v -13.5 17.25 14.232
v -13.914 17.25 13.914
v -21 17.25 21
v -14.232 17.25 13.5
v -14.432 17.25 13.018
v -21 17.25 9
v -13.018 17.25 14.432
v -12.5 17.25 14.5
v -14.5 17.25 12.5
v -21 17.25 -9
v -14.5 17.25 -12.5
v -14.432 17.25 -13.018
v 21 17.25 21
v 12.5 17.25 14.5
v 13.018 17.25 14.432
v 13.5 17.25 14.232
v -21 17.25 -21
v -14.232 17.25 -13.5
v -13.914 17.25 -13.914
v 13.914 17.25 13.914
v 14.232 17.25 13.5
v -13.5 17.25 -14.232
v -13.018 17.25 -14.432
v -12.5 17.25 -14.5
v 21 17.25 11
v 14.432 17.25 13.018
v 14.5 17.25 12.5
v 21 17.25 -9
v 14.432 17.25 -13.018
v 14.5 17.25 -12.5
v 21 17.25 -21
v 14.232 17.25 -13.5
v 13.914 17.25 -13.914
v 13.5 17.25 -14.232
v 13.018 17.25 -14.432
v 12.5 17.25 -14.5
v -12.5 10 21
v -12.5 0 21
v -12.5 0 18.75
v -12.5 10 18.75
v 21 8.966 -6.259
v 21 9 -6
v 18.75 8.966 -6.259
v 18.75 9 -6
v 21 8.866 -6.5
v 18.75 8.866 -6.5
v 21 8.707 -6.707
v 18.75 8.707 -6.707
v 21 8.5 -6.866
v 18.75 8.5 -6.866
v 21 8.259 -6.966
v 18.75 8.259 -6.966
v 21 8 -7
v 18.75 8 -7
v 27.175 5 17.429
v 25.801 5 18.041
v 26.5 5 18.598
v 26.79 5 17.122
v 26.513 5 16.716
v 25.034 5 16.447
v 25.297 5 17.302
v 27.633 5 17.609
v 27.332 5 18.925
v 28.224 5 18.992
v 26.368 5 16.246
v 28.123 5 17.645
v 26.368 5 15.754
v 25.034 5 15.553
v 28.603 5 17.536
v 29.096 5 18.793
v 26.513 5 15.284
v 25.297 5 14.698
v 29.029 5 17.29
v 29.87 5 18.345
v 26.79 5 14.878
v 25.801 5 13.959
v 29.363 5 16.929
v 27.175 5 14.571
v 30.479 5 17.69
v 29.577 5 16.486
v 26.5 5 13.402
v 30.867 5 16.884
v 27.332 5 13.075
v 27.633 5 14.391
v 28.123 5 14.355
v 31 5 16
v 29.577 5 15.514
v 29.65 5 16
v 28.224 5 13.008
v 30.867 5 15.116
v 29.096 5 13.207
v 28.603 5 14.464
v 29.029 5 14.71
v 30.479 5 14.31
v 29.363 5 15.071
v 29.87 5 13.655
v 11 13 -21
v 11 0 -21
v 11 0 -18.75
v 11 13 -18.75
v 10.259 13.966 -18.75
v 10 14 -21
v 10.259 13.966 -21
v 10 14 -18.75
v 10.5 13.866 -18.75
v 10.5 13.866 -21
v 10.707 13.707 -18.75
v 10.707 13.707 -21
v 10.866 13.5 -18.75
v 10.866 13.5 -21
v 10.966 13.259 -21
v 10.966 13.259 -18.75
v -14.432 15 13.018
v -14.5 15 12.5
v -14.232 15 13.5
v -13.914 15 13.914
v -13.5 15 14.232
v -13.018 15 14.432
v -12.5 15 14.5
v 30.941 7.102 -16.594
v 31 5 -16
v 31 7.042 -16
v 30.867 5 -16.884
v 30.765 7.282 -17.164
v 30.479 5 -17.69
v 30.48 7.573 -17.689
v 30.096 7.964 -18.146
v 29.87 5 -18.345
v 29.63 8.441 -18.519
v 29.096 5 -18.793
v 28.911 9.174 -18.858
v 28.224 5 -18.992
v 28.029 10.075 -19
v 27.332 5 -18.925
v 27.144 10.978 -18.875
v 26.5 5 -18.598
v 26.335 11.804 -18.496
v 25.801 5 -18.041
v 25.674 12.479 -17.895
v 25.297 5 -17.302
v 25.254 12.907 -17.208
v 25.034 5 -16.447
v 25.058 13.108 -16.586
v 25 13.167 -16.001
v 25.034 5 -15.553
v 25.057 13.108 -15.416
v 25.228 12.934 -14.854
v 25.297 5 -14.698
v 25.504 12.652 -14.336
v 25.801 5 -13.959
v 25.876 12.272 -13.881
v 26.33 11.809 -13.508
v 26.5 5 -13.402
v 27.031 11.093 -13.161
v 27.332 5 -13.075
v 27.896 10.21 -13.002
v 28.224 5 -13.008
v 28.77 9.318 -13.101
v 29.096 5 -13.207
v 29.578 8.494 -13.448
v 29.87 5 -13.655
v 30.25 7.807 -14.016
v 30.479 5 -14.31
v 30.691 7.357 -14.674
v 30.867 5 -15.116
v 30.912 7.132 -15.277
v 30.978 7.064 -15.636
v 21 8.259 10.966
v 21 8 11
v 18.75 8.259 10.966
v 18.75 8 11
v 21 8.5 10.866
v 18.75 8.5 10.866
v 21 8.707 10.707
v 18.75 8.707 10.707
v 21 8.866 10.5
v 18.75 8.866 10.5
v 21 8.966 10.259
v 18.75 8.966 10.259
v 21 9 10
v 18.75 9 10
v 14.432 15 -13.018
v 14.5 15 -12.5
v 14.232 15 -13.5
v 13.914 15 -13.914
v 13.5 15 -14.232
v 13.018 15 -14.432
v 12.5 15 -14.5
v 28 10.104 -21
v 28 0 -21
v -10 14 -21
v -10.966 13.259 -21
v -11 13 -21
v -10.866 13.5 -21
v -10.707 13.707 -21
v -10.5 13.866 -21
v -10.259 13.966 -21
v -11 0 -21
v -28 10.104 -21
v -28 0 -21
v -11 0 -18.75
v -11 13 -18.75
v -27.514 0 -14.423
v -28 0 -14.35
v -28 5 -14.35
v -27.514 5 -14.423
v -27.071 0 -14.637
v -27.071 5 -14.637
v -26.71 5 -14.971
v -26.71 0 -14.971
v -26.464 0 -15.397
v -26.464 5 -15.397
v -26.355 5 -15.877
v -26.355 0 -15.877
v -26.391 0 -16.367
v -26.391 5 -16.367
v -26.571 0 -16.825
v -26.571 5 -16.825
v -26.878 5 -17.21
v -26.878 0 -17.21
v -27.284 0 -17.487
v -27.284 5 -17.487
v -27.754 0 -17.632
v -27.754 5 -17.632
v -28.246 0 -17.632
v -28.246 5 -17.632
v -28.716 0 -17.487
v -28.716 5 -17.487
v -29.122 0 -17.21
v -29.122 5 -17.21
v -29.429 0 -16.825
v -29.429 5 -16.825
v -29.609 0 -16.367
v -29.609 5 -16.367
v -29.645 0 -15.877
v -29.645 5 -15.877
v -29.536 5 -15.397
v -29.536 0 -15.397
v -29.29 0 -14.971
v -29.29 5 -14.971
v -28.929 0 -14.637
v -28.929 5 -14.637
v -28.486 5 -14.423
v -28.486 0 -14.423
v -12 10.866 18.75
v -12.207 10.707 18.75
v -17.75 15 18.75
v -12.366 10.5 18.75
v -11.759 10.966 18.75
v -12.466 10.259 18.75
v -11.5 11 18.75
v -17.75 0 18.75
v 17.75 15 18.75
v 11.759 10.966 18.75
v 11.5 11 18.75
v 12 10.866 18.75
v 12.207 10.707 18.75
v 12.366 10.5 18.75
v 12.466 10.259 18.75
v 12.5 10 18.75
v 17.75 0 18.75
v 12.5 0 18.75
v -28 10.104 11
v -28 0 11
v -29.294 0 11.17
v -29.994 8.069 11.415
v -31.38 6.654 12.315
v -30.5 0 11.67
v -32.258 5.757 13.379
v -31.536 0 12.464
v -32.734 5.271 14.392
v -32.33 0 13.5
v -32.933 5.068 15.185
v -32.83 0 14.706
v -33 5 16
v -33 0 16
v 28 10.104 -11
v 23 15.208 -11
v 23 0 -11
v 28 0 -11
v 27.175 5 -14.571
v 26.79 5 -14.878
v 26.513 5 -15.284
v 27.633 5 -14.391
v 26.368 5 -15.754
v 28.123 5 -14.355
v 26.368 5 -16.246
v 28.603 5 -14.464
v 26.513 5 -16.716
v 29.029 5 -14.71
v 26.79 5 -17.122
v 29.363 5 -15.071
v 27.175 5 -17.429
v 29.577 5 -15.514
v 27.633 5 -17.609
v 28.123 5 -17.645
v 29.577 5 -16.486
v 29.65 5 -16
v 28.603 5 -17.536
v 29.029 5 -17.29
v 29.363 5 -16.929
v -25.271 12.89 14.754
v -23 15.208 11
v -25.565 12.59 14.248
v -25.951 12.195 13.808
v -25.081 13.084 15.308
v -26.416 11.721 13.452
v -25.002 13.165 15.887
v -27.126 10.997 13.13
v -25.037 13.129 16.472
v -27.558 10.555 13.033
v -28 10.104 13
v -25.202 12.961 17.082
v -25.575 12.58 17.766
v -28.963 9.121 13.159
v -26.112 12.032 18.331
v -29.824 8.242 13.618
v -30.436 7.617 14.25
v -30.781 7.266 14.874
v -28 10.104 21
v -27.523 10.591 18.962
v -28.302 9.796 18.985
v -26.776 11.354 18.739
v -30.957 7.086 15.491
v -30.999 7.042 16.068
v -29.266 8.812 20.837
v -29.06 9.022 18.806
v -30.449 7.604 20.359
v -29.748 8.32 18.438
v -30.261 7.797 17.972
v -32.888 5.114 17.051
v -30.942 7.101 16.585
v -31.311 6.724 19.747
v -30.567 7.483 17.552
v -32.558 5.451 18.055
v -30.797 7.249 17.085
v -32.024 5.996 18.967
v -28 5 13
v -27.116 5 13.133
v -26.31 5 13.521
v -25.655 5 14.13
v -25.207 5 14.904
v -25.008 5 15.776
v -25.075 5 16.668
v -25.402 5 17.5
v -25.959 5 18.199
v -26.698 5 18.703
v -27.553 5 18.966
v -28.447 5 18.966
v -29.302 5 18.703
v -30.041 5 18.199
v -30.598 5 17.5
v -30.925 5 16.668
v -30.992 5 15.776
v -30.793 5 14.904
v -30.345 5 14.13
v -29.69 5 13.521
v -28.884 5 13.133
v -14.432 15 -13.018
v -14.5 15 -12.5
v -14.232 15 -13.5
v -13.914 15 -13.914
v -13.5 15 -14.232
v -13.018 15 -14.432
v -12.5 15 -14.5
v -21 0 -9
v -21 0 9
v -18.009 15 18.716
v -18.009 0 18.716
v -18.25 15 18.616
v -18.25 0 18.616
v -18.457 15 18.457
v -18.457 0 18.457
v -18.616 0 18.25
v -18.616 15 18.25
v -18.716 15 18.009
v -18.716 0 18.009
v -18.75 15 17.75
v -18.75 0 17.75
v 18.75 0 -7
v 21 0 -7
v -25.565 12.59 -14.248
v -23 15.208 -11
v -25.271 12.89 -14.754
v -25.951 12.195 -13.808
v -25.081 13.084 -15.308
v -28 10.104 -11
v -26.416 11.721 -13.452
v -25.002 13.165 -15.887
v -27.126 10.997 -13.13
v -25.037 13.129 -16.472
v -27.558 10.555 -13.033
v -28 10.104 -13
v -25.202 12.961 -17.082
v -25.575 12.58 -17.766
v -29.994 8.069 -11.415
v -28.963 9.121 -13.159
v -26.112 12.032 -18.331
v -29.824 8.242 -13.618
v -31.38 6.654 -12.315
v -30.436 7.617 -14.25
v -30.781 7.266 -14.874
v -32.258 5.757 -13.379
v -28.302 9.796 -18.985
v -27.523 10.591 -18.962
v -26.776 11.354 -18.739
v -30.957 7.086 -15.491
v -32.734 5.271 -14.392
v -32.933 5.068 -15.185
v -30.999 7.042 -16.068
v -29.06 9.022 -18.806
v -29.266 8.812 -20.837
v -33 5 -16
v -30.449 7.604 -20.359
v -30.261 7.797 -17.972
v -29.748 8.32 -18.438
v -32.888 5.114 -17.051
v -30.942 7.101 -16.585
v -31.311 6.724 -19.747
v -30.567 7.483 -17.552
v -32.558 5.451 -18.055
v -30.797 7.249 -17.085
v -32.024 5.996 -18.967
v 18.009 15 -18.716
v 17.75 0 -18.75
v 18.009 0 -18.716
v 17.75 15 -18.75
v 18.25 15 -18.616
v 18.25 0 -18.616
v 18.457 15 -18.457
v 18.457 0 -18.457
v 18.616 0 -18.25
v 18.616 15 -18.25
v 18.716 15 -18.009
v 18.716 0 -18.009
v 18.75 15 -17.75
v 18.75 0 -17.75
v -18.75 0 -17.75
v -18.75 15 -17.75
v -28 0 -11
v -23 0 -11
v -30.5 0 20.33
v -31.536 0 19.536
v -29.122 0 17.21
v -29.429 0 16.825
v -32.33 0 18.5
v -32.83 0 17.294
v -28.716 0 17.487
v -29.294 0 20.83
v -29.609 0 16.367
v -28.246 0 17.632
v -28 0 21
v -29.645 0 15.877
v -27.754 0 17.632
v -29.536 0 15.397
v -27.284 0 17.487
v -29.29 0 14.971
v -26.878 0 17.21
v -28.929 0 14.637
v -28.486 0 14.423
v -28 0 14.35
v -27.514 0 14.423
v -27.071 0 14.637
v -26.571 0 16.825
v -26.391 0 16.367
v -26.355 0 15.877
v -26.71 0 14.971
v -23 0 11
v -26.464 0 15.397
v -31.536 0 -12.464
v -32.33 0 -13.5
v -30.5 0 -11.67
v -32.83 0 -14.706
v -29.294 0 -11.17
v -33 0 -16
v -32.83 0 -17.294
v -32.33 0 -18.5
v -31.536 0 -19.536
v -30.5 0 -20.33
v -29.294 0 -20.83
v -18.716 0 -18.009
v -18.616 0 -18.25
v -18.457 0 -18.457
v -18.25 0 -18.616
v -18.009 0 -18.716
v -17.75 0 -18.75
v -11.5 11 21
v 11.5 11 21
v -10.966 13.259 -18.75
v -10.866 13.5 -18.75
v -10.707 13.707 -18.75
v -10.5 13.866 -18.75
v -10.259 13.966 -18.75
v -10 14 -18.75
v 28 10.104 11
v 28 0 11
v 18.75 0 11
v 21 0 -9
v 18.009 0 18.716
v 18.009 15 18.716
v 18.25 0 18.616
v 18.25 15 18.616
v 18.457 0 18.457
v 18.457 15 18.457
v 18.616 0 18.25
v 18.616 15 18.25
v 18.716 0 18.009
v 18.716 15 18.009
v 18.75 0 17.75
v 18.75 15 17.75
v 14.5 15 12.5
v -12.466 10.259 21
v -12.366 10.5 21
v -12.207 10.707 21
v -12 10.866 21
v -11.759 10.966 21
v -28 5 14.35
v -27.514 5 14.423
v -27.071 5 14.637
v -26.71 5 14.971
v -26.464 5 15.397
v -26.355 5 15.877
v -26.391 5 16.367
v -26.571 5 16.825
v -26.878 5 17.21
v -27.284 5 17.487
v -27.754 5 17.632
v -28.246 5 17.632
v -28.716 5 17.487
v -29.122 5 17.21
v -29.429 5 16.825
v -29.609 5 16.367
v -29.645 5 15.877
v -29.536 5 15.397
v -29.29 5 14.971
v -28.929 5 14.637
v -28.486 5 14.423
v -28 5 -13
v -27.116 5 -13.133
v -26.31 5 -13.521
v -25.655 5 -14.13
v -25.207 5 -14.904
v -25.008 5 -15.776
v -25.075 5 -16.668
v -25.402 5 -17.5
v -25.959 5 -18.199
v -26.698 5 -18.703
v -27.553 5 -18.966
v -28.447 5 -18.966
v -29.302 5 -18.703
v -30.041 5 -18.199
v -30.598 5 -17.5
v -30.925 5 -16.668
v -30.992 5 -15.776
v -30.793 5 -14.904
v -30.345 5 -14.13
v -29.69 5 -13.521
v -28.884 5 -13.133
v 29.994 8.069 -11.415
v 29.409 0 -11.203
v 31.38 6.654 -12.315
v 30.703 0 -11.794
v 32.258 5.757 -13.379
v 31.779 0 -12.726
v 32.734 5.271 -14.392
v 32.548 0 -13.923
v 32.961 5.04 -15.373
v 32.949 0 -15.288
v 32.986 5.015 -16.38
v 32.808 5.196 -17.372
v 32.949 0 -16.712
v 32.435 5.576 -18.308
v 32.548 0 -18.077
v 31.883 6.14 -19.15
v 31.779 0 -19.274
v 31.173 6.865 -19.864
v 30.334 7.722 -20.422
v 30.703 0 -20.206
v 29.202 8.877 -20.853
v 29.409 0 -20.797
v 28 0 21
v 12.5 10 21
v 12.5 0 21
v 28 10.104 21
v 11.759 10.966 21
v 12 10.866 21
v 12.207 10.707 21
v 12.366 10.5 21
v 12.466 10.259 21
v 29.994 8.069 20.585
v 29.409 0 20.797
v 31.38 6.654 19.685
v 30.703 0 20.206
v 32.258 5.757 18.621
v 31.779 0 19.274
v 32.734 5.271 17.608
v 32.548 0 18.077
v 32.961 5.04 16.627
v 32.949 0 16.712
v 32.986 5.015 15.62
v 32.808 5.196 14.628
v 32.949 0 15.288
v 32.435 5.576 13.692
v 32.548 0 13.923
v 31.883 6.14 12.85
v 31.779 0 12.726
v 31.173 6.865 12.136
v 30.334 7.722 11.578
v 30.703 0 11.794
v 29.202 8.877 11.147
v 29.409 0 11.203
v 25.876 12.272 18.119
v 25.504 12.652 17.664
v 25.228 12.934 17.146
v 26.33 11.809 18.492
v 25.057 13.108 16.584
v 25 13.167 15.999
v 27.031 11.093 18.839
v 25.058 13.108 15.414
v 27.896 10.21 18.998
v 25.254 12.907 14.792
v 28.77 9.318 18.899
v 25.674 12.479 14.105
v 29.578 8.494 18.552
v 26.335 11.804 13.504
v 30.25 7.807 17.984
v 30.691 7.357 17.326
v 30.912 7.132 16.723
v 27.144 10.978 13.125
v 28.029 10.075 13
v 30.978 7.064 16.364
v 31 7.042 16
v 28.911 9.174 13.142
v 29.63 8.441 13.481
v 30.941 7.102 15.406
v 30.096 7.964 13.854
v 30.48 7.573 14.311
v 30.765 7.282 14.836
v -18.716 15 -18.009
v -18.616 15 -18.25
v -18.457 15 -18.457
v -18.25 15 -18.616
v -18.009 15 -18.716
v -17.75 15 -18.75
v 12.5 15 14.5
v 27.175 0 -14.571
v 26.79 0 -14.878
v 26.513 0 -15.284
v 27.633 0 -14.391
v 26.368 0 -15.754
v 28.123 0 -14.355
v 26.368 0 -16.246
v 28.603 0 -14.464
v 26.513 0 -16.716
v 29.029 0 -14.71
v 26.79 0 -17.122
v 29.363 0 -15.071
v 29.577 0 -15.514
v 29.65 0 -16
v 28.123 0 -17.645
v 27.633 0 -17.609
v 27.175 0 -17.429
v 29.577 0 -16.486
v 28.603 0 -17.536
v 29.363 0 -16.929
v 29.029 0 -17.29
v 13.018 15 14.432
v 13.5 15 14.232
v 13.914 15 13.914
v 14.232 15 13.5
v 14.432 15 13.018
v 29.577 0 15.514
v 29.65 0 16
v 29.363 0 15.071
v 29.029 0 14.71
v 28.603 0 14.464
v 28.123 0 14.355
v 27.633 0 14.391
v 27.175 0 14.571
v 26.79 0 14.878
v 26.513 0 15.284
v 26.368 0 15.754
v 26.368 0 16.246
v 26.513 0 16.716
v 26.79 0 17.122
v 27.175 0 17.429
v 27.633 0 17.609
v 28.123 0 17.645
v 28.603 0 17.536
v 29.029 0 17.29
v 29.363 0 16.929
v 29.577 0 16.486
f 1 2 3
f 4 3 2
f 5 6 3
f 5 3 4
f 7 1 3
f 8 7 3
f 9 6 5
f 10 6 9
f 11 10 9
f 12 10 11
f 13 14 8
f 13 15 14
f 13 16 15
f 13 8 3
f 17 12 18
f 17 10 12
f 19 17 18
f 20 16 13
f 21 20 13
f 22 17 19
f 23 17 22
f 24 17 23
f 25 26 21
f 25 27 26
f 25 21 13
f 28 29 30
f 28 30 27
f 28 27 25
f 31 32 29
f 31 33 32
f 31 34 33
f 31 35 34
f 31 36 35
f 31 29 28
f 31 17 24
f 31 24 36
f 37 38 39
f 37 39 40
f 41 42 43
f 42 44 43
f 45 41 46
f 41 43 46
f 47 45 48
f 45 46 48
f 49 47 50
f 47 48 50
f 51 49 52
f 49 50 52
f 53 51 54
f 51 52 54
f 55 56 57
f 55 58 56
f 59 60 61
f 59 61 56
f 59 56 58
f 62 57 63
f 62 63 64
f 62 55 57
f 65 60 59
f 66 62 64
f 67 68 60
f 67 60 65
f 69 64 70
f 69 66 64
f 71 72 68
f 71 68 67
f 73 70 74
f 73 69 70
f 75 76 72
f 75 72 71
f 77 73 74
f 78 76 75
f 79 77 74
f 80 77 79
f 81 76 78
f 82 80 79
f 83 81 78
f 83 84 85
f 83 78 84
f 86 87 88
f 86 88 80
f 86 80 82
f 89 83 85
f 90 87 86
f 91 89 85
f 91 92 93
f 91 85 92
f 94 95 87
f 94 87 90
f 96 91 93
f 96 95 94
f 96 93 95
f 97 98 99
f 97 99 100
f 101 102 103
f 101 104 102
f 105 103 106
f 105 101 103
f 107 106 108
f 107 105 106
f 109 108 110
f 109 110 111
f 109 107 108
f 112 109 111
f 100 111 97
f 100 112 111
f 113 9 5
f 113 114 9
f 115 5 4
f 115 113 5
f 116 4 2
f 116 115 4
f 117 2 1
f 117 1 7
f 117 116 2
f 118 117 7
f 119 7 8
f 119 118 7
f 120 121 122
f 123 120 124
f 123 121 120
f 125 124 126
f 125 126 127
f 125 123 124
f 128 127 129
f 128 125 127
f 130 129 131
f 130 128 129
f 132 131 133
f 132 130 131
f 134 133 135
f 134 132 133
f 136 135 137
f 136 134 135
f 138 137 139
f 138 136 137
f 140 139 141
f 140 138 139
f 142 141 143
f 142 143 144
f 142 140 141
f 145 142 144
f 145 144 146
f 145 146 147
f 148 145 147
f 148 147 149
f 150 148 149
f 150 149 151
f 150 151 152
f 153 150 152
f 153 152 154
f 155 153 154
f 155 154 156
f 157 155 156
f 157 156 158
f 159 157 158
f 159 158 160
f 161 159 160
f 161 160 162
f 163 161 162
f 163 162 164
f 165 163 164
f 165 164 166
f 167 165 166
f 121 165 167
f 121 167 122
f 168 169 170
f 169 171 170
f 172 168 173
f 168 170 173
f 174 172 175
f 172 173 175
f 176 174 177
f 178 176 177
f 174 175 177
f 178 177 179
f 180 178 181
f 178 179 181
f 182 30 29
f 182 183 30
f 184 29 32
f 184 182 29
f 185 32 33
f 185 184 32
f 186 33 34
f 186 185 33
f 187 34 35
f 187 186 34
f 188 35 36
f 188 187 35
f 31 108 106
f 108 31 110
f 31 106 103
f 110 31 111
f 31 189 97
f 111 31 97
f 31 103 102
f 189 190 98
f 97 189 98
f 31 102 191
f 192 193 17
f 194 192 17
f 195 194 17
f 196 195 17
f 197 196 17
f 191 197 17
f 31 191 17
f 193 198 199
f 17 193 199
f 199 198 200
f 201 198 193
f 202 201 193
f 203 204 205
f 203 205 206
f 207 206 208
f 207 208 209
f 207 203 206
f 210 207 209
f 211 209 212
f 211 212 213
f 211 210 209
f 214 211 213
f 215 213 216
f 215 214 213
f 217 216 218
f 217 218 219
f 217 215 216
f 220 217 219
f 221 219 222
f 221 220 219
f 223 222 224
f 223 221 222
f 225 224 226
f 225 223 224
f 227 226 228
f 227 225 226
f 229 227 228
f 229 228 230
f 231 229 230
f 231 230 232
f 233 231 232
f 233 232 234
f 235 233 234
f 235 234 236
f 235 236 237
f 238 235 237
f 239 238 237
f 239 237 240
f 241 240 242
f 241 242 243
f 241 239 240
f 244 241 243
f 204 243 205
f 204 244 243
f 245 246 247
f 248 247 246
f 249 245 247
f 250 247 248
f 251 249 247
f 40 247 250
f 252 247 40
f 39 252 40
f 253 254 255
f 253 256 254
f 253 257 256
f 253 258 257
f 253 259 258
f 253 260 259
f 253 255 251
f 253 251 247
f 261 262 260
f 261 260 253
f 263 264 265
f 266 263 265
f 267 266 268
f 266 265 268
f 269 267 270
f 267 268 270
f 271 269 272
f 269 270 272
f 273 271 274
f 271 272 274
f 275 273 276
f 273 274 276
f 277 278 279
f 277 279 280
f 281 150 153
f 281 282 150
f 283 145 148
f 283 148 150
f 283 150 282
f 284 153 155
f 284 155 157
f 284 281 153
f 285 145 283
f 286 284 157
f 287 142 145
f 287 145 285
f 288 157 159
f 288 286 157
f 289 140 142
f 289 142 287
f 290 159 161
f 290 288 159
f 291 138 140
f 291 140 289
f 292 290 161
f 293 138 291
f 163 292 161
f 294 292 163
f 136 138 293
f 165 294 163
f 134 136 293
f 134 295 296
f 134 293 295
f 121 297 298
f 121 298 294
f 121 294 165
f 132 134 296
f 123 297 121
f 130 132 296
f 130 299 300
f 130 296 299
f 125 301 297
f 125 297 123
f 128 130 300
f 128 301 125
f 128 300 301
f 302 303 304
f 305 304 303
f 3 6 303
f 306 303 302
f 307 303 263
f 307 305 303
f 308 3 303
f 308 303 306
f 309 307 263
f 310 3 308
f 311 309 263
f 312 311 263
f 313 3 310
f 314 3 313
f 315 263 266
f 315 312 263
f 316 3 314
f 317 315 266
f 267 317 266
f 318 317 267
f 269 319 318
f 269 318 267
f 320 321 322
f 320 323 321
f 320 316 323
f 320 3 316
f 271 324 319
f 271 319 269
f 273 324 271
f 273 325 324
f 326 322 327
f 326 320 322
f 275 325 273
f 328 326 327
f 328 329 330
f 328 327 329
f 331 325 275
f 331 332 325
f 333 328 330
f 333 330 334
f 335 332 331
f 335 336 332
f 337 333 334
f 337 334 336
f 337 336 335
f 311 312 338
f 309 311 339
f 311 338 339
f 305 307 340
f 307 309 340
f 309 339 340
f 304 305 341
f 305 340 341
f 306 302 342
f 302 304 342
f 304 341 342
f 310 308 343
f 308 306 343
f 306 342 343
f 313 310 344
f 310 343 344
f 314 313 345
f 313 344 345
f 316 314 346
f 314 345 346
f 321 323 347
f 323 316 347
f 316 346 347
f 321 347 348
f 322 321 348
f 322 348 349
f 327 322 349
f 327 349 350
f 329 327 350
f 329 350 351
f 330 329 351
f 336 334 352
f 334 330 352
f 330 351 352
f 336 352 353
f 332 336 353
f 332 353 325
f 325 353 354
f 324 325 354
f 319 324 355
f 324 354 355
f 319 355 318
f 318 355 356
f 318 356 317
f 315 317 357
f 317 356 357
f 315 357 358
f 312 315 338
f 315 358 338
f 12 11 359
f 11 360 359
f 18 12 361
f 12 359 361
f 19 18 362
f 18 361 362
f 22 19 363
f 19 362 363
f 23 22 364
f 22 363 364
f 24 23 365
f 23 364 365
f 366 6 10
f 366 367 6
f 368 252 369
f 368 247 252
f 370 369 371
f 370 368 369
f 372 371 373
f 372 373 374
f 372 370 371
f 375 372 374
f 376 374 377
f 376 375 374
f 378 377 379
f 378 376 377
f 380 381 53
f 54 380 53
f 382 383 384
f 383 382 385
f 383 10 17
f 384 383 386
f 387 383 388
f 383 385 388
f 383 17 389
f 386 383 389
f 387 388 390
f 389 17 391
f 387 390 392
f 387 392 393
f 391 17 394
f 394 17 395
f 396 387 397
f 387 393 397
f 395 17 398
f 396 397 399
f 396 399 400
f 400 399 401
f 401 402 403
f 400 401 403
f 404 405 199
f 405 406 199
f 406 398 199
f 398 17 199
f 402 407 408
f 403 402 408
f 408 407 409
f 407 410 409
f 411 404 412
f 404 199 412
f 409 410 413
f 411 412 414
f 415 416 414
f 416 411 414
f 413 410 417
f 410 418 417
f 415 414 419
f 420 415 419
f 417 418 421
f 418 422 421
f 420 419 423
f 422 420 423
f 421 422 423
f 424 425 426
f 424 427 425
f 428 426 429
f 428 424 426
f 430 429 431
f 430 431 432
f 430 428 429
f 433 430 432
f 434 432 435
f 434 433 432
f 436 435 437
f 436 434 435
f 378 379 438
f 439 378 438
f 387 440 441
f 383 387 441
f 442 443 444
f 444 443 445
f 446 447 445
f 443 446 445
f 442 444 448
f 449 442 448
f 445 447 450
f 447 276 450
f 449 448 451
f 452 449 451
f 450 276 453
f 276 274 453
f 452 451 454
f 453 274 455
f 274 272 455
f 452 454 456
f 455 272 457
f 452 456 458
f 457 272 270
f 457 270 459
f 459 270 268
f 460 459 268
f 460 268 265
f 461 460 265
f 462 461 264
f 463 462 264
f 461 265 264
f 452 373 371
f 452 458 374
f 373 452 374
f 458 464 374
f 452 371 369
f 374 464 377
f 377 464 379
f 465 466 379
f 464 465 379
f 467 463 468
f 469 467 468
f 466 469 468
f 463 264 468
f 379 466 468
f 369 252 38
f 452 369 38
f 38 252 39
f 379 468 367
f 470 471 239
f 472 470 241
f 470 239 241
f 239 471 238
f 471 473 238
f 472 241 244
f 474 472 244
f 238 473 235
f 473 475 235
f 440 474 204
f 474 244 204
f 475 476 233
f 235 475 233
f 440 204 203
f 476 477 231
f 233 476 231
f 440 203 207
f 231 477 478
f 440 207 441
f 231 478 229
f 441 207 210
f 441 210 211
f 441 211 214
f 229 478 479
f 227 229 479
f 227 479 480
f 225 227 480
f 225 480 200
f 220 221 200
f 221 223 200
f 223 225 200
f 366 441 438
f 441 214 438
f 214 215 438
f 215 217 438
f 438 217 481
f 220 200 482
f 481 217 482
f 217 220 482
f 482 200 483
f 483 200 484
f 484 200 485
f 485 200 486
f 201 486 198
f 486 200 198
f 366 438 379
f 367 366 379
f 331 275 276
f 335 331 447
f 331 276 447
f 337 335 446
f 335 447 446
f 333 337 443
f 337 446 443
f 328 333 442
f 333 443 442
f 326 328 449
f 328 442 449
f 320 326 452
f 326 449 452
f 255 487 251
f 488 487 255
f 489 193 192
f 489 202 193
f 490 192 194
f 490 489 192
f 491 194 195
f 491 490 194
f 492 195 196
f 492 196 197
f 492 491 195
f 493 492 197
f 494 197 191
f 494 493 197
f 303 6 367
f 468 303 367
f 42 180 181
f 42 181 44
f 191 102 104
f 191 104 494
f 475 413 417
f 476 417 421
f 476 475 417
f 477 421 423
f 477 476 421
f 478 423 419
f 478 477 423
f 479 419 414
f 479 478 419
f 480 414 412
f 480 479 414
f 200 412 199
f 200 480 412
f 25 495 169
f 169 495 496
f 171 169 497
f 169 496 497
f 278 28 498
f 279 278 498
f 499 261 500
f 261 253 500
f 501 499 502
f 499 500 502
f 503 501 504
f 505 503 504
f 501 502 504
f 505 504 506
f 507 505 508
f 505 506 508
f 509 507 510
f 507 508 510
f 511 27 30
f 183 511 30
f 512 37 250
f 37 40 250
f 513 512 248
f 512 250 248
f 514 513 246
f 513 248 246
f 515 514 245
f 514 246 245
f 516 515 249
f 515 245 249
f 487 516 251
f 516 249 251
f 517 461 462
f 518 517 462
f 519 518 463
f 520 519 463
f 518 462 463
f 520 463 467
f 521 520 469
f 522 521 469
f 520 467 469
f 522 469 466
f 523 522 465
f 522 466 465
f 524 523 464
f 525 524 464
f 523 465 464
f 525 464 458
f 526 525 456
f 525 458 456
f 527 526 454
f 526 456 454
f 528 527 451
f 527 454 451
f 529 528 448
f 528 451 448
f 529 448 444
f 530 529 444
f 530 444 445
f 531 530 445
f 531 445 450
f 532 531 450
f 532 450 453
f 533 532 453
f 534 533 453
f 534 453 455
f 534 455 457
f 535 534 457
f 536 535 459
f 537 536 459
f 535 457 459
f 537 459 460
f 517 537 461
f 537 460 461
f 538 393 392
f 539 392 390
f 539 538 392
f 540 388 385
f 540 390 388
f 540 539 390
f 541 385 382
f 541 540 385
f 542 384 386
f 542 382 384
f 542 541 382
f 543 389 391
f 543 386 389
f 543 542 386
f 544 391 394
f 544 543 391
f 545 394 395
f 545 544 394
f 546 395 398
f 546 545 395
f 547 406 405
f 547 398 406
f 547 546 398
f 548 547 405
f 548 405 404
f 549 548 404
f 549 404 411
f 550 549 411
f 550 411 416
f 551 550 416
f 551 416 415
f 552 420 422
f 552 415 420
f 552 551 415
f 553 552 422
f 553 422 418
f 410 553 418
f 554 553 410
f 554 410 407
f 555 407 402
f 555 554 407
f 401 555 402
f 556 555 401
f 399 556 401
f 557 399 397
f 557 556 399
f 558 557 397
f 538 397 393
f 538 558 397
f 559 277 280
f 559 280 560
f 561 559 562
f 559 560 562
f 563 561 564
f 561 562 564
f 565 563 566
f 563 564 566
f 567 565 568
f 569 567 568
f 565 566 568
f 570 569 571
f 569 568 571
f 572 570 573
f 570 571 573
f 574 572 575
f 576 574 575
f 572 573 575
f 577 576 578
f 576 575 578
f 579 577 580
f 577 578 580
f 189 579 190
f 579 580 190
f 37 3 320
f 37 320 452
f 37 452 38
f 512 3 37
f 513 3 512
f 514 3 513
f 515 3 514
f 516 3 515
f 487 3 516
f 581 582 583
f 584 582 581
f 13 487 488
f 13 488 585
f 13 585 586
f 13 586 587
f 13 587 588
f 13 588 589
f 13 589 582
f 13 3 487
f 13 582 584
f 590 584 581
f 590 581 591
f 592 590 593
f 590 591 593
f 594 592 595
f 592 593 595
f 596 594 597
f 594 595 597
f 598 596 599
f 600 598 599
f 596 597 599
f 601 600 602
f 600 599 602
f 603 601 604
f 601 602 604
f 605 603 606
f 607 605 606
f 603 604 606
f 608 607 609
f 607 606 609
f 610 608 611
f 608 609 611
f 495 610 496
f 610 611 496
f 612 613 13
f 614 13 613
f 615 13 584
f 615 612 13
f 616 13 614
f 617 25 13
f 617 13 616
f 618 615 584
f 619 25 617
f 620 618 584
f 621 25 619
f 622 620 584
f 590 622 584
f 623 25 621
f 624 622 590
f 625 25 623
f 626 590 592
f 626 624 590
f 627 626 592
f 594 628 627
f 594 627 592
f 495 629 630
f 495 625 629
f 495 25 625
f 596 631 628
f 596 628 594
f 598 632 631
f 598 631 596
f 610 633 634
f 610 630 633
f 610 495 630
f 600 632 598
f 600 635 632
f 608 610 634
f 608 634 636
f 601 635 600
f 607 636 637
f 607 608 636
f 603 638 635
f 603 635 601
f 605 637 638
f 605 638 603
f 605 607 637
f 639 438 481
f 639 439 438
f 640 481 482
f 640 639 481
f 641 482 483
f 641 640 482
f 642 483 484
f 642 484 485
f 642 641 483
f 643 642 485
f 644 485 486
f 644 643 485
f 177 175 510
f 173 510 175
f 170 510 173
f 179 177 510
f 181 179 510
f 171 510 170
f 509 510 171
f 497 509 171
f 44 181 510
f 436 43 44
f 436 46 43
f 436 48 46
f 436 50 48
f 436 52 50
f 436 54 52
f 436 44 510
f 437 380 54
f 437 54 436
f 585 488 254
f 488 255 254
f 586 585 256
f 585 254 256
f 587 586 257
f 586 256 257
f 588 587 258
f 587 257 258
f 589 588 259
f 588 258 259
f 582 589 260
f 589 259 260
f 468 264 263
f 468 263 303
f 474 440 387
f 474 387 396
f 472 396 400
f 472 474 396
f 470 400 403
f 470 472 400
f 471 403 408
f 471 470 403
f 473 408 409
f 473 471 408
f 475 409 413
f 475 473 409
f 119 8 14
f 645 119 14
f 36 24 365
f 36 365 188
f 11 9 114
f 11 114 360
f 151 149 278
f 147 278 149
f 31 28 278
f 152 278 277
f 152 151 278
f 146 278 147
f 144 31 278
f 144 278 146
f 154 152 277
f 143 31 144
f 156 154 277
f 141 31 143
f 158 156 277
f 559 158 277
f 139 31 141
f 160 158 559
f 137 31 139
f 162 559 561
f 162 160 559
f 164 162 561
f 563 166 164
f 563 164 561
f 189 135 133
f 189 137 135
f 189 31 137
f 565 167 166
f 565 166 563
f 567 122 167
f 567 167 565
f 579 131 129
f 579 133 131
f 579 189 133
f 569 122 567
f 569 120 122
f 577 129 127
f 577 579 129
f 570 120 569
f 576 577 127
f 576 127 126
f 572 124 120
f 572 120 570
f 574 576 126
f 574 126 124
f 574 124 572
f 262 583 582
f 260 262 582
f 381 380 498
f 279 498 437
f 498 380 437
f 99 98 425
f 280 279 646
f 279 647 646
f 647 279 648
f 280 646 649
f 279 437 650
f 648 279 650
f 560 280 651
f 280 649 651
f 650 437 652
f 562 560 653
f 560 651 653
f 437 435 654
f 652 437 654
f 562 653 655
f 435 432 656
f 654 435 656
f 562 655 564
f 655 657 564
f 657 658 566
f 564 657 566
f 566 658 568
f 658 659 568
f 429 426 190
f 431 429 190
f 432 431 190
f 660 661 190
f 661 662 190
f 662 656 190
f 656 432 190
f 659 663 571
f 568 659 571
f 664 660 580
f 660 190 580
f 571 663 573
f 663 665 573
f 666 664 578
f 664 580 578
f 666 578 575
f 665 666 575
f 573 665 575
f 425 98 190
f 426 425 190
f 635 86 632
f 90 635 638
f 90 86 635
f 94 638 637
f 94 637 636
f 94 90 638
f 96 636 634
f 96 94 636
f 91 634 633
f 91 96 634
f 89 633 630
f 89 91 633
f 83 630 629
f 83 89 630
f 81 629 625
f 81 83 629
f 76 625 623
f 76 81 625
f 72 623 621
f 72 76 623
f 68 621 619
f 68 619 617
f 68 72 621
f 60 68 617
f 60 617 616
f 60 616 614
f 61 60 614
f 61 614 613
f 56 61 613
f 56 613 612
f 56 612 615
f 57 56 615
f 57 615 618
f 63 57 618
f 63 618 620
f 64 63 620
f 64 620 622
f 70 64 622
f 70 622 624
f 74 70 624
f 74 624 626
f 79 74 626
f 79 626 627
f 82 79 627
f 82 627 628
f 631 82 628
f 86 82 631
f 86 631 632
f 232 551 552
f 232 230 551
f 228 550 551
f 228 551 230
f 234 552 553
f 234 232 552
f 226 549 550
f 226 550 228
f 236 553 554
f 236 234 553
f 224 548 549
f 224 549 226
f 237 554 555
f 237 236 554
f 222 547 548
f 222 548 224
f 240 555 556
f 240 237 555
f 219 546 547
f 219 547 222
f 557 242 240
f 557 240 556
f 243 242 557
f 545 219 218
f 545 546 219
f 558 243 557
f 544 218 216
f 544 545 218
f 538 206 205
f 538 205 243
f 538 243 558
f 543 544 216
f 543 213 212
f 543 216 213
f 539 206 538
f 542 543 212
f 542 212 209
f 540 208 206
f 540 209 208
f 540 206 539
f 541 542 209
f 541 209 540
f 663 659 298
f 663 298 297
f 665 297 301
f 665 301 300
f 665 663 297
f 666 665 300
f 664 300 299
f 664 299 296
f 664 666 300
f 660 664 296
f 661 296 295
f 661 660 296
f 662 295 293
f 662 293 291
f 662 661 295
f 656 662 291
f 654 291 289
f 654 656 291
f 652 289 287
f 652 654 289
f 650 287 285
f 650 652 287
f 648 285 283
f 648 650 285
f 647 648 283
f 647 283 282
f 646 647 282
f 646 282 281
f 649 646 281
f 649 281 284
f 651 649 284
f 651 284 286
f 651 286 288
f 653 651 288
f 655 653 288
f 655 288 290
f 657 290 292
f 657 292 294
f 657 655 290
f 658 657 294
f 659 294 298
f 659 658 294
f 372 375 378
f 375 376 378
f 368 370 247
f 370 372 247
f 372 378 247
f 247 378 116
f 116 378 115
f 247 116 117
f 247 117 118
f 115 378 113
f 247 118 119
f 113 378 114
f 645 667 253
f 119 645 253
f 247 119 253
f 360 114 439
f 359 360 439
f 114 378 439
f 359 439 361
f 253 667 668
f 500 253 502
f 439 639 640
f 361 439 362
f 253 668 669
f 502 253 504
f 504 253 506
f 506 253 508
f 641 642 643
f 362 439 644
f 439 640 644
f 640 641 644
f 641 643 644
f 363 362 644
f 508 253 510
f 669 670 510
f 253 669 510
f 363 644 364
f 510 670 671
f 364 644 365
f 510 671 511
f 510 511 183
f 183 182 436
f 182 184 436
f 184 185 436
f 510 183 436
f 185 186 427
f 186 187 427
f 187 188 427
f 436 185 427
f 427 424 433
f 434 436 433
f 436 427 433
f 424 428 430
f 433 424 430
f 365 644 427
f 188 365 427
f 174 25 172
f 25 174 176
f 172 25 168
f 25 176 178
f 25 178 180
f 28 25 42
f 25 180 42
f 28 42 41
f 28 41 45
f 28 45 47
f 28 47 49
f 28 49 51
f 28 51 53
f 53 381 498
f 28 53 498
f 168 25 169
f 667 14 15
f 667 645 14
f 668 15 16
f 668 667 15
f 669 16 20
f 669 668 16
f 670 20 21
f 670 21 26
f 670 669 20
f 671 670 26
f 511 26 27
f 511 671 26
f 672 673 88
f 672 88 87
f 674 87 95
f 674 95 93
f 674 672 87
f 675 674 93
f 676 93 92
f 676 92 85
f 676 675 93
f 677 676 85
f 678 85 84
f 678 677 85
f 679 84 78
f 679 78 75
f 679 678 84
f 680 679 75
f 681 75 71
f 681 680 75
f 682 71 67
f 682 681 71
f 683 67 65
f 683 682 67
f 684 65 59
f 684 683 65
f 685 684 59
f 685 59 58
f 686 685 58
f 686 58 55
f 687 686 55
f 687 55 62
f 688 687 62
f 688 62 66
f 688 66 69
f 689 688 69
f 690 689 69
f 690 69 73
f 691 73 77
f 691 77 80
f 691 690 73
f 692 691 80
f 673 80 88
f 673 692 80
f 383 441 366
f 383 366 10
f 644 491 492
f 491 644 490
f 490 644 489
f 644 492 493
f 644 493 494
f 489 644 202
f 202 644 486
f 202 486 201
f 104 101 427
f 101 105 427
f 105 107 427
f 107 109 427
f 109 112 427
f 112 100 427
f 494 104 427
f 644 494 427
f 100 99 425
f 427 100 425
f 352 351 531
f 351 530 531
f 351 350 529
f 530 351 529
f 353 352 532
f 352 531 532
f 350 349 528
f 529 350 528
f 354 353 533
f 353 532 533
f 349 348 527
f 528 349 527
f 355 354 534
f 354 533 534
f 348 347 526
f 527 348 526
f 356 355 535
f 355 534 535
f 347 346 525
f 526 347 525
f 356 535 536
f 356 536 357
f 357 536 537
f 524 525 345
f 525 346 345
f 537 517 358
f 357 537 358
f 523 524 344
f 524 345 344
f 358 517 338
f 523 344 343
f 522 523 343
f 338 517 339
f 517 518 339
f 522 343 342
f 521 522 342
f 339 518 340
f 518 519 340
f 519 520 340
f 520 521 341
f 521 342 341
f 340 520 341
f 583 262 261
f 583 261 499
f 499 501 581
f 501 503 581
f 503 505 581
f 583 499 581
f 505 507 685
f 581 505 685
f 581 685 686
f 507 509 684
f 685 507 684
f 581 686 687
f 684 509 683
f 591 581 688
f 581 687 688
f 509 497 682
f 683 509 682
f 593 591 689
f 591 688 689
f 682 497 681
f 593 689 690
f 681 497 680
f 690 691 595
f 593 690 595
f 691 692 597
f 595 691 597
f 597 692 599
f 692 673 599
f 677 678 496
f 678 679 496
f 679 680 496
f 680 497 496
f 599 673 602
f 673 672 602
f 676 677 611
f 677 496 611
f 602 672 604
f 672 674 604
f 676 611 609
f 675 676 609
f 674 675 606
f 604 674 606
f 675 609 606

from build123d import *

# Parameters (mm, degrees)
SKETCH1_W           = 37.5
SKETCH1_H           = 37.5
BOSS_EXTRUDE1_DEPTH = 15
SHELL1_T            = 2.25
CUT_EXTRUDE1_REACH  = 52.026
SKETCH2_W           = 25
SKETCH2_H           = 11
CUT_EXTRUDE2_REACH  = 52.026
SKETCH3_W           = 18
SKETCH3_H           = 9
CUT_EXTRUDE3_REACH  = 36.345
SKETCH5_W           = 29
SKETCH5_H           = 29
FILLET1_R           = 2
CUT_EXTRUDE4_REACH  = 52.026
SKETCH6_W           = 22
SKETCH6_H           = 14
FILLET2_R           = 1
SKETCH9_W           = 12
SKETCH9_H           = 10
BOSS_EXTRUDE3_DEPTH = 5
BOSS_EXTRUDE4_DEPTH = 10
SKETCH11_R          = 1.65
CUT_EXTRUDE5_DEPTH  = 5
CUT_EXTRUDE6_REACH  = 42.989
SKETCH12_R          = 3
CUT_EXTRUDE7_REACH  = 44.75
MIRROR3_OUTLINE_R   = 1.65
MIRROR3_DEPTH       = 5
MIRROR3_START       = 5
MIRROR3_2_OUTLINE_R = 3
MIRROR3_2_DEPTH     = 12.25
MIRROR3_START_2     = 27.072732359
MIRROR3_3_OUTLINE_W = 20
MIRROR3_3_OUTLINE_H = 11
MIRROR3_3_DEPTH     = 9.927267641
CHAMFER1_SIZE       = 2
FILLET3_R           = 1


with BuildPart() as part:
    # Sketch1 → Boss-Extrude1 (new body)
    with BuildSketch(Plane(origin=(0, 0, 0), x_dir=(1, 0, 0), z_dir=(0, 1, 0))):
        Rectangle(SKETCH1_W, SKETCH1_H)
    extrude(amount=BOSS_EXTRUDE1_DEPTH)

    # Shell1
    shell1_openings = [part.faces().sort_by_distance(p)[0] for p in [
        (0, 0, 0),
    ]]
    offset(amount=SHELL1_T, openings=shell1_openings, kind=Kind.INTERSECTION)

    # Sketch2 → Cut-Extrude1 (cut, up to next)
    with BuildSketch(Plane.XY.offset(21), mode=Mode.PRIVATE) as cut_extrude1_sk1:
        with Locations((0, 5.5)):
            Rectangle(SKETCH2_W, SKETCH2_H)
    cut_extrude1_tool1 = extrude(cut_extrude1_sk1.sketch, amount=-CUT_EXTRUDE1_REACH, mode=Mode.PRIVATE) & part.part
    add(cut_extrude1_tool1.solids().sort_by_distance((0, 5.5, 21))[0], mode=Mode.SUBTRACT)

    # Sketch3 → Cut-Extrude2 (cut, up to next)
    with BuildSketch(Plane(origin=(21, 0, 0), x_dir=(0, 0, -1), z_dir=(1, 0, 0)), mode=Mode.PRIVATE) as cut_extrude2_sk1:
        with Locations((-2, 4.5)):
            Rectangle(SKETCH3_W, SKETCH3_H)
    cut_extrude2_tool1 = extrude(cut_extrude2_sk1.sketch, amount=-CUT_EXTRUDE2_REACH, mode=Mode.PRIVATE) & part.part
    add(cut_extrude2_tool1.solids().sort_by_distance((21, 4.5, 2))[0], mode=Mode.SUBTRACT)

    # Sketch5 → Cut-Extrude3 (cut, up to next)
    with BuildSketch(Plane(origin=(0, 17.25, 0), x_dir=(1, 0, 0), z_dir=(0, 1, 0)), mode=Mode.PRIVATE) as cut_extrude3_sk1:
        Rectangle(SKETCH5_W, SKETCH5_H)
    cut_extrude3_tool1 = extrude(cut_extrude3_sk1.sketch, amount=-CUT_EXTRUDE3_REACH, mode=Mode.PRIVATE) & part.part
    add(cut_extrude3_tool1.solids().sort_by_distance((0, 17.25, 0))[0], mode=Mode.SUBTRACT)

    # Fillet1
    fillet1_edges = [part.edges().sort_by_distance(p)[0] for p in [
        (14.5, 16.125, -14.5),
        (14.5, 16.125, 14.5),
        (-14.5, 16.125, 14.5),
        (-14.5, 16.125, -14.5),
    ]]
    fillet(fillet1_edges, radius=FILLET1_R)

    # Sketch6 → Cut-Extrude4 (cut, up to next)
    with BuildSketch(Plane(origin=(0, 0, -21), x_dir=(-1, 0, 0), z_dir=(0, 0, -1)), mode=Mode.PRIVATE) as cut_extrude4_sk1:
        with Locations((0, 7)):
            Rectangle(SKETCH6_W, SKETCH6_H)
    cut_extrude4_tool1 = extrude(cut_extrude4_sk1.sketch, amount=-CUT_EXTRUDE4_REACH, mode=Mode.PRIVATE) & part.part
    add(cut_extrude4_tool1.solids().sort_by_distance((0, 7, -21))[0], mode=Mode.SUBTRACT)

    # Fillet2
    fillet2_edges = [part.edges().sort_by_distance(p)[0] for p in [
        (-11, 14, -19.875),
        (11, 14, -19.875),
        (12.5, 11, 19.875),
        (-12.5, 11, 19.875),
        (19.875, 9, 11),
        (19.875, 9, -7),
    ]]
    fillet(fillet2_edges, radius=FILLET2_R)

    # Sketch9 → Boss-Extrude3 (add)
    with BuildSketch(Plane.XZ):
        with Locations((-27, 16)):
            Rectangle(SKETCH9_W, SKETCH9_H)
    boss_extrude3 = extrude(amount=-BOSS_EXTRUDE3_DEPTH)

    # Sketch10 → Boss-Extrude4 (add)
    with BuildSketch(Plane.XY.offset(21)):
        Polygon((-21, 17.25), (-33, 5), (-21, 5), align=None)
    boss_extrude4 = extrude(amount=-BOSS_EXTRUDE4_DEPTH)

    # Sketch11 → Cut-Extrude5 (cut)
    with BuildSketch(Plane.XZ):
        with Locations(Location((-28, 16, 0), (0, 0, 270))):
            Circle(SKETCH11_R)
    cut_extrude5 = extrude(amount=-CUT_EXTRUDE5_DEPTH, mode=Mode.SUBTRACT)

    # Cut-Extrude6: up to this plane
    cut_extrude6_end = Plane(origin=(-21, 17.25, -6.14825064), z_dir=(-0.7143585813751187, 0.6997798348164429, 0))
    # Sketch12 → Cut-Extrude6 (cut, up to the surface)
    with BuildSketch(Plane.XZ.offset(-5), mode=Mode.PRIVATE) as cut_extrude6_sk1:
        with Locations(Location((-28, 16, 0), (0, 0, 270))):
            Circle(SKETCH12_R)
    cut_extrude6_tool1 = split(extrude(cut_extrude6_sk1.sketch, amount=-CUT_EXTRUDE6_REACH, mode=Mode.PRIVATE), bisect_by=cut_extrude6_end, keep=Keep.BOTH, mode=Mode.PRIVATE)
    cut_extrude6 = cut_extrude6_tool1.solids().sort_by_distance((-28, 5, 16))[0]
    add(cut_extrude6, mode=Mode.SUBTRACT)

    # Cut-Extrude7: up to this plane
    cut_extrude7_end = Plane(origin=(-21, 17.25, -6.14825064), z_dir=(-0.7143585813751187, 0.6997798348164429, 0))
    # Sketch13 → Cut-Extrude7 (cut, up to the surface)
    with BuildSketch(Plane.XZ, mode=Mode.PRIVATE) as cut_extrude7_sk1:
        with BuildLine():
            ThreePointArc((-33, 16), (-31.535533906, 19.535533906), (-28, 21))
            Line((-28, 21), (-33, 21))
            Line((-33, 21), (-33, 16))
        make_face()
    cut_extrude7_tool1 = split(extrude(cut_extrude7_sk1.sketch, amount=-CUT_EXTRUDE7_REACH, mode=Mode.PRIVATE), bisect_by=cut_extrude7_end, keep=Keep.BOTH, mode=Mode.PRIVATE)
    # Sketch13 → Cut-Extrude7 (cut, up to the surface)
    with BuildSketch(Plane.XZ, mode=Mode.PRIVATE) as cut_extrude7_sk2:
        with BuildLine():
            Line((-33, 11), (-28, 11))
            ThreePointArc((-28, 11), (-31.535533906, 12.464466094), (-33, 16))
            Line((-33, 16), (-33, 11))
        make_face()
    cut_extrude7_tool2 = split(extrude(cut_extrude7_sk2.sketch, amount=-CUT_EXTRUDE7_REACH, mode=Mode.PRIVATE), bisect_by=cut_extrude7_end, keep=Keep.BOTH, mode=Mode.PRIVATE)
    cut_extrude7 = cut_extrude7_tool1.solids().sort_by_distance((-31.88316, 0, 19.88316))[0] + cut_extrude7_tool2.solids().sort_by_distance((-31.88316, 0, 12.11684))[0]
    add(cut_extrude7, mode=Mode.SUBTRACT)

    # Mirror1: Boss-Extrude3, Boss-Extrude4, Cut-Extrude5, Cut-Extrude6, Cut-Extrude7 across plane
    add(boss_extrude3.mirror(Plane.XY))
    add(boss_extrude4.mirror(Plane.XY))
    add(cut_extrude5.mirror(Plane.XY), mode=Mode.SUBTRACT)
    add(cut_extrude6.mirror(Plane.XY), mode=Mode.SUBTRACT)
    add(cut_extrude7.mirror(Plane.XY), mode=Mode.SUBTRACT)

    # Mirror3: read off the stored shape, not the designer's step
    # Mirror3 outline → Mirror3 (add)
    # profile 1 of 2: a face of its own
    with BuildSketch(Plane(origin=(0, 0, 0), x_dir=(1, 0, 0), z_dir=(0, 1, 0))):
        with BuildLine():
            Line((21, 21), (21, 11))
            Line((21, 11), (28, 11))
            ThreePointArc((28, 11), (33, 16), (28, 21))
            Line((28, 21), (21, 21))
        make_face()
        with Locations((28, 16)):
            Circle(MIRROR3_OUTLINE_R, mode=Mode.SUBTRACT)
    # profile 2 of 2: a face of its own
    with BuildSketch(Plane(origin=(0, 0, 0), x_dir=(1, 0, 0), z_dir=(0, 1, 0))):
        with BuildLine():
            Line((28, -11), (21, -11))
            Line((21, -11), (21, -21))
            Line((21, -21), (28, -21))
            ThreePointArc((28, -21), (33, -16), (28, -11))
        make_face()
        with Locations((28, -16)):
            Circle(MIRROR3_OUTLINE_R, mode=Mode.SUBTRACT)
    extrude(amount=MIRROR3_DEPTH)

    # Mirror3 2 outline → Mirror3 2 (add)
    # profile 1 of 2: a face of its own
    with BuildSketch(Plane(origin=(0, 0, 0), x_dir=(1, 0, 0), z_dir=(0, 1, 0)).offset(MIRROR3_START)):
        with BuildLine():
            Line((21, 21), (21, 11))
            Line((21, 11), (28, 11))
            ThreePointArc((28, 11), (33, 16), (28, 21))
            Line((28, 21), (21, 21))
        make_face()
        with Locations((28, 16)):
            Circle(MIRROR3_2_OUTLINE_R, mode=Mode.SUBTRACT)
    # profile 2 of 2: a face of its own
    with BuildSketch(Plane(origin=(0, 0, 0), x_dir=(1, 0, 0), z_dir=(0, 1, 0)).offset(MIRROR3_START)):
        with BuildLine():
            Line((28, -11), (21, -11))
            Line((21, -11), (21, -21))
            Line((21, -21), (28, -21))
            ThreePointArc((28, -21), (33, -16), (28, -11))
        make_face()
        with Locations((28, -16)):
            Circle(MIRROR3_2_OUTLINE_R, mode=Mode.SUBTRACT)
    extrude(amount=MIRROR3_2_DEPTH)

    # Mirror3 3 outline → Mirror3 3 (cut)
    with BuildSketch(Plane(origin=(0, 0, 0), x_dir=(0.6997798348164427, -0.7143585813751188, 0), z_dir=(0.7143585813751188, 0.6997798348164428, 0)).offset(MIRROR3_START_2)):
        with Locations((11, 16.5)):
            Rectangle(MIRROR3_3_OUTLINE_W, MIRROR3_3_OUTLINE_H)
        with Locations((11, -16.5)):
            Rectangle(MIRROR3_3_OUTLINE_W, MIRROR3_3_OUTLINE_H)
    extrude(amount=MIRROR3_3_DEPTH, mode=Mode.SUBTRACT)

    # Chamfer1
    chamfer1_edges = [part.edges().sort_by_distance(p)[0] for p in [
        (-21, 8.625, 11),
        (-21, 8.625, -11),
        (21, 8.625, -11),
    ]]
    chamfer(chamfer1_edges, length=CHAMFER1_SIZE)

    # Fillet3
    fillet3_edges = [part.edges().sort_by_distance(p)[0] for p in [
        (18.75, 7.5, 18.75),
        (18.75, 7.5, -18.75),
        (-18.75, 7.5, -18.75),
        (-18.75, 7.5, 18.75),
    ]]
    fillet(fillet3_edges, radius=FILLET3_R)


solid = part.part
